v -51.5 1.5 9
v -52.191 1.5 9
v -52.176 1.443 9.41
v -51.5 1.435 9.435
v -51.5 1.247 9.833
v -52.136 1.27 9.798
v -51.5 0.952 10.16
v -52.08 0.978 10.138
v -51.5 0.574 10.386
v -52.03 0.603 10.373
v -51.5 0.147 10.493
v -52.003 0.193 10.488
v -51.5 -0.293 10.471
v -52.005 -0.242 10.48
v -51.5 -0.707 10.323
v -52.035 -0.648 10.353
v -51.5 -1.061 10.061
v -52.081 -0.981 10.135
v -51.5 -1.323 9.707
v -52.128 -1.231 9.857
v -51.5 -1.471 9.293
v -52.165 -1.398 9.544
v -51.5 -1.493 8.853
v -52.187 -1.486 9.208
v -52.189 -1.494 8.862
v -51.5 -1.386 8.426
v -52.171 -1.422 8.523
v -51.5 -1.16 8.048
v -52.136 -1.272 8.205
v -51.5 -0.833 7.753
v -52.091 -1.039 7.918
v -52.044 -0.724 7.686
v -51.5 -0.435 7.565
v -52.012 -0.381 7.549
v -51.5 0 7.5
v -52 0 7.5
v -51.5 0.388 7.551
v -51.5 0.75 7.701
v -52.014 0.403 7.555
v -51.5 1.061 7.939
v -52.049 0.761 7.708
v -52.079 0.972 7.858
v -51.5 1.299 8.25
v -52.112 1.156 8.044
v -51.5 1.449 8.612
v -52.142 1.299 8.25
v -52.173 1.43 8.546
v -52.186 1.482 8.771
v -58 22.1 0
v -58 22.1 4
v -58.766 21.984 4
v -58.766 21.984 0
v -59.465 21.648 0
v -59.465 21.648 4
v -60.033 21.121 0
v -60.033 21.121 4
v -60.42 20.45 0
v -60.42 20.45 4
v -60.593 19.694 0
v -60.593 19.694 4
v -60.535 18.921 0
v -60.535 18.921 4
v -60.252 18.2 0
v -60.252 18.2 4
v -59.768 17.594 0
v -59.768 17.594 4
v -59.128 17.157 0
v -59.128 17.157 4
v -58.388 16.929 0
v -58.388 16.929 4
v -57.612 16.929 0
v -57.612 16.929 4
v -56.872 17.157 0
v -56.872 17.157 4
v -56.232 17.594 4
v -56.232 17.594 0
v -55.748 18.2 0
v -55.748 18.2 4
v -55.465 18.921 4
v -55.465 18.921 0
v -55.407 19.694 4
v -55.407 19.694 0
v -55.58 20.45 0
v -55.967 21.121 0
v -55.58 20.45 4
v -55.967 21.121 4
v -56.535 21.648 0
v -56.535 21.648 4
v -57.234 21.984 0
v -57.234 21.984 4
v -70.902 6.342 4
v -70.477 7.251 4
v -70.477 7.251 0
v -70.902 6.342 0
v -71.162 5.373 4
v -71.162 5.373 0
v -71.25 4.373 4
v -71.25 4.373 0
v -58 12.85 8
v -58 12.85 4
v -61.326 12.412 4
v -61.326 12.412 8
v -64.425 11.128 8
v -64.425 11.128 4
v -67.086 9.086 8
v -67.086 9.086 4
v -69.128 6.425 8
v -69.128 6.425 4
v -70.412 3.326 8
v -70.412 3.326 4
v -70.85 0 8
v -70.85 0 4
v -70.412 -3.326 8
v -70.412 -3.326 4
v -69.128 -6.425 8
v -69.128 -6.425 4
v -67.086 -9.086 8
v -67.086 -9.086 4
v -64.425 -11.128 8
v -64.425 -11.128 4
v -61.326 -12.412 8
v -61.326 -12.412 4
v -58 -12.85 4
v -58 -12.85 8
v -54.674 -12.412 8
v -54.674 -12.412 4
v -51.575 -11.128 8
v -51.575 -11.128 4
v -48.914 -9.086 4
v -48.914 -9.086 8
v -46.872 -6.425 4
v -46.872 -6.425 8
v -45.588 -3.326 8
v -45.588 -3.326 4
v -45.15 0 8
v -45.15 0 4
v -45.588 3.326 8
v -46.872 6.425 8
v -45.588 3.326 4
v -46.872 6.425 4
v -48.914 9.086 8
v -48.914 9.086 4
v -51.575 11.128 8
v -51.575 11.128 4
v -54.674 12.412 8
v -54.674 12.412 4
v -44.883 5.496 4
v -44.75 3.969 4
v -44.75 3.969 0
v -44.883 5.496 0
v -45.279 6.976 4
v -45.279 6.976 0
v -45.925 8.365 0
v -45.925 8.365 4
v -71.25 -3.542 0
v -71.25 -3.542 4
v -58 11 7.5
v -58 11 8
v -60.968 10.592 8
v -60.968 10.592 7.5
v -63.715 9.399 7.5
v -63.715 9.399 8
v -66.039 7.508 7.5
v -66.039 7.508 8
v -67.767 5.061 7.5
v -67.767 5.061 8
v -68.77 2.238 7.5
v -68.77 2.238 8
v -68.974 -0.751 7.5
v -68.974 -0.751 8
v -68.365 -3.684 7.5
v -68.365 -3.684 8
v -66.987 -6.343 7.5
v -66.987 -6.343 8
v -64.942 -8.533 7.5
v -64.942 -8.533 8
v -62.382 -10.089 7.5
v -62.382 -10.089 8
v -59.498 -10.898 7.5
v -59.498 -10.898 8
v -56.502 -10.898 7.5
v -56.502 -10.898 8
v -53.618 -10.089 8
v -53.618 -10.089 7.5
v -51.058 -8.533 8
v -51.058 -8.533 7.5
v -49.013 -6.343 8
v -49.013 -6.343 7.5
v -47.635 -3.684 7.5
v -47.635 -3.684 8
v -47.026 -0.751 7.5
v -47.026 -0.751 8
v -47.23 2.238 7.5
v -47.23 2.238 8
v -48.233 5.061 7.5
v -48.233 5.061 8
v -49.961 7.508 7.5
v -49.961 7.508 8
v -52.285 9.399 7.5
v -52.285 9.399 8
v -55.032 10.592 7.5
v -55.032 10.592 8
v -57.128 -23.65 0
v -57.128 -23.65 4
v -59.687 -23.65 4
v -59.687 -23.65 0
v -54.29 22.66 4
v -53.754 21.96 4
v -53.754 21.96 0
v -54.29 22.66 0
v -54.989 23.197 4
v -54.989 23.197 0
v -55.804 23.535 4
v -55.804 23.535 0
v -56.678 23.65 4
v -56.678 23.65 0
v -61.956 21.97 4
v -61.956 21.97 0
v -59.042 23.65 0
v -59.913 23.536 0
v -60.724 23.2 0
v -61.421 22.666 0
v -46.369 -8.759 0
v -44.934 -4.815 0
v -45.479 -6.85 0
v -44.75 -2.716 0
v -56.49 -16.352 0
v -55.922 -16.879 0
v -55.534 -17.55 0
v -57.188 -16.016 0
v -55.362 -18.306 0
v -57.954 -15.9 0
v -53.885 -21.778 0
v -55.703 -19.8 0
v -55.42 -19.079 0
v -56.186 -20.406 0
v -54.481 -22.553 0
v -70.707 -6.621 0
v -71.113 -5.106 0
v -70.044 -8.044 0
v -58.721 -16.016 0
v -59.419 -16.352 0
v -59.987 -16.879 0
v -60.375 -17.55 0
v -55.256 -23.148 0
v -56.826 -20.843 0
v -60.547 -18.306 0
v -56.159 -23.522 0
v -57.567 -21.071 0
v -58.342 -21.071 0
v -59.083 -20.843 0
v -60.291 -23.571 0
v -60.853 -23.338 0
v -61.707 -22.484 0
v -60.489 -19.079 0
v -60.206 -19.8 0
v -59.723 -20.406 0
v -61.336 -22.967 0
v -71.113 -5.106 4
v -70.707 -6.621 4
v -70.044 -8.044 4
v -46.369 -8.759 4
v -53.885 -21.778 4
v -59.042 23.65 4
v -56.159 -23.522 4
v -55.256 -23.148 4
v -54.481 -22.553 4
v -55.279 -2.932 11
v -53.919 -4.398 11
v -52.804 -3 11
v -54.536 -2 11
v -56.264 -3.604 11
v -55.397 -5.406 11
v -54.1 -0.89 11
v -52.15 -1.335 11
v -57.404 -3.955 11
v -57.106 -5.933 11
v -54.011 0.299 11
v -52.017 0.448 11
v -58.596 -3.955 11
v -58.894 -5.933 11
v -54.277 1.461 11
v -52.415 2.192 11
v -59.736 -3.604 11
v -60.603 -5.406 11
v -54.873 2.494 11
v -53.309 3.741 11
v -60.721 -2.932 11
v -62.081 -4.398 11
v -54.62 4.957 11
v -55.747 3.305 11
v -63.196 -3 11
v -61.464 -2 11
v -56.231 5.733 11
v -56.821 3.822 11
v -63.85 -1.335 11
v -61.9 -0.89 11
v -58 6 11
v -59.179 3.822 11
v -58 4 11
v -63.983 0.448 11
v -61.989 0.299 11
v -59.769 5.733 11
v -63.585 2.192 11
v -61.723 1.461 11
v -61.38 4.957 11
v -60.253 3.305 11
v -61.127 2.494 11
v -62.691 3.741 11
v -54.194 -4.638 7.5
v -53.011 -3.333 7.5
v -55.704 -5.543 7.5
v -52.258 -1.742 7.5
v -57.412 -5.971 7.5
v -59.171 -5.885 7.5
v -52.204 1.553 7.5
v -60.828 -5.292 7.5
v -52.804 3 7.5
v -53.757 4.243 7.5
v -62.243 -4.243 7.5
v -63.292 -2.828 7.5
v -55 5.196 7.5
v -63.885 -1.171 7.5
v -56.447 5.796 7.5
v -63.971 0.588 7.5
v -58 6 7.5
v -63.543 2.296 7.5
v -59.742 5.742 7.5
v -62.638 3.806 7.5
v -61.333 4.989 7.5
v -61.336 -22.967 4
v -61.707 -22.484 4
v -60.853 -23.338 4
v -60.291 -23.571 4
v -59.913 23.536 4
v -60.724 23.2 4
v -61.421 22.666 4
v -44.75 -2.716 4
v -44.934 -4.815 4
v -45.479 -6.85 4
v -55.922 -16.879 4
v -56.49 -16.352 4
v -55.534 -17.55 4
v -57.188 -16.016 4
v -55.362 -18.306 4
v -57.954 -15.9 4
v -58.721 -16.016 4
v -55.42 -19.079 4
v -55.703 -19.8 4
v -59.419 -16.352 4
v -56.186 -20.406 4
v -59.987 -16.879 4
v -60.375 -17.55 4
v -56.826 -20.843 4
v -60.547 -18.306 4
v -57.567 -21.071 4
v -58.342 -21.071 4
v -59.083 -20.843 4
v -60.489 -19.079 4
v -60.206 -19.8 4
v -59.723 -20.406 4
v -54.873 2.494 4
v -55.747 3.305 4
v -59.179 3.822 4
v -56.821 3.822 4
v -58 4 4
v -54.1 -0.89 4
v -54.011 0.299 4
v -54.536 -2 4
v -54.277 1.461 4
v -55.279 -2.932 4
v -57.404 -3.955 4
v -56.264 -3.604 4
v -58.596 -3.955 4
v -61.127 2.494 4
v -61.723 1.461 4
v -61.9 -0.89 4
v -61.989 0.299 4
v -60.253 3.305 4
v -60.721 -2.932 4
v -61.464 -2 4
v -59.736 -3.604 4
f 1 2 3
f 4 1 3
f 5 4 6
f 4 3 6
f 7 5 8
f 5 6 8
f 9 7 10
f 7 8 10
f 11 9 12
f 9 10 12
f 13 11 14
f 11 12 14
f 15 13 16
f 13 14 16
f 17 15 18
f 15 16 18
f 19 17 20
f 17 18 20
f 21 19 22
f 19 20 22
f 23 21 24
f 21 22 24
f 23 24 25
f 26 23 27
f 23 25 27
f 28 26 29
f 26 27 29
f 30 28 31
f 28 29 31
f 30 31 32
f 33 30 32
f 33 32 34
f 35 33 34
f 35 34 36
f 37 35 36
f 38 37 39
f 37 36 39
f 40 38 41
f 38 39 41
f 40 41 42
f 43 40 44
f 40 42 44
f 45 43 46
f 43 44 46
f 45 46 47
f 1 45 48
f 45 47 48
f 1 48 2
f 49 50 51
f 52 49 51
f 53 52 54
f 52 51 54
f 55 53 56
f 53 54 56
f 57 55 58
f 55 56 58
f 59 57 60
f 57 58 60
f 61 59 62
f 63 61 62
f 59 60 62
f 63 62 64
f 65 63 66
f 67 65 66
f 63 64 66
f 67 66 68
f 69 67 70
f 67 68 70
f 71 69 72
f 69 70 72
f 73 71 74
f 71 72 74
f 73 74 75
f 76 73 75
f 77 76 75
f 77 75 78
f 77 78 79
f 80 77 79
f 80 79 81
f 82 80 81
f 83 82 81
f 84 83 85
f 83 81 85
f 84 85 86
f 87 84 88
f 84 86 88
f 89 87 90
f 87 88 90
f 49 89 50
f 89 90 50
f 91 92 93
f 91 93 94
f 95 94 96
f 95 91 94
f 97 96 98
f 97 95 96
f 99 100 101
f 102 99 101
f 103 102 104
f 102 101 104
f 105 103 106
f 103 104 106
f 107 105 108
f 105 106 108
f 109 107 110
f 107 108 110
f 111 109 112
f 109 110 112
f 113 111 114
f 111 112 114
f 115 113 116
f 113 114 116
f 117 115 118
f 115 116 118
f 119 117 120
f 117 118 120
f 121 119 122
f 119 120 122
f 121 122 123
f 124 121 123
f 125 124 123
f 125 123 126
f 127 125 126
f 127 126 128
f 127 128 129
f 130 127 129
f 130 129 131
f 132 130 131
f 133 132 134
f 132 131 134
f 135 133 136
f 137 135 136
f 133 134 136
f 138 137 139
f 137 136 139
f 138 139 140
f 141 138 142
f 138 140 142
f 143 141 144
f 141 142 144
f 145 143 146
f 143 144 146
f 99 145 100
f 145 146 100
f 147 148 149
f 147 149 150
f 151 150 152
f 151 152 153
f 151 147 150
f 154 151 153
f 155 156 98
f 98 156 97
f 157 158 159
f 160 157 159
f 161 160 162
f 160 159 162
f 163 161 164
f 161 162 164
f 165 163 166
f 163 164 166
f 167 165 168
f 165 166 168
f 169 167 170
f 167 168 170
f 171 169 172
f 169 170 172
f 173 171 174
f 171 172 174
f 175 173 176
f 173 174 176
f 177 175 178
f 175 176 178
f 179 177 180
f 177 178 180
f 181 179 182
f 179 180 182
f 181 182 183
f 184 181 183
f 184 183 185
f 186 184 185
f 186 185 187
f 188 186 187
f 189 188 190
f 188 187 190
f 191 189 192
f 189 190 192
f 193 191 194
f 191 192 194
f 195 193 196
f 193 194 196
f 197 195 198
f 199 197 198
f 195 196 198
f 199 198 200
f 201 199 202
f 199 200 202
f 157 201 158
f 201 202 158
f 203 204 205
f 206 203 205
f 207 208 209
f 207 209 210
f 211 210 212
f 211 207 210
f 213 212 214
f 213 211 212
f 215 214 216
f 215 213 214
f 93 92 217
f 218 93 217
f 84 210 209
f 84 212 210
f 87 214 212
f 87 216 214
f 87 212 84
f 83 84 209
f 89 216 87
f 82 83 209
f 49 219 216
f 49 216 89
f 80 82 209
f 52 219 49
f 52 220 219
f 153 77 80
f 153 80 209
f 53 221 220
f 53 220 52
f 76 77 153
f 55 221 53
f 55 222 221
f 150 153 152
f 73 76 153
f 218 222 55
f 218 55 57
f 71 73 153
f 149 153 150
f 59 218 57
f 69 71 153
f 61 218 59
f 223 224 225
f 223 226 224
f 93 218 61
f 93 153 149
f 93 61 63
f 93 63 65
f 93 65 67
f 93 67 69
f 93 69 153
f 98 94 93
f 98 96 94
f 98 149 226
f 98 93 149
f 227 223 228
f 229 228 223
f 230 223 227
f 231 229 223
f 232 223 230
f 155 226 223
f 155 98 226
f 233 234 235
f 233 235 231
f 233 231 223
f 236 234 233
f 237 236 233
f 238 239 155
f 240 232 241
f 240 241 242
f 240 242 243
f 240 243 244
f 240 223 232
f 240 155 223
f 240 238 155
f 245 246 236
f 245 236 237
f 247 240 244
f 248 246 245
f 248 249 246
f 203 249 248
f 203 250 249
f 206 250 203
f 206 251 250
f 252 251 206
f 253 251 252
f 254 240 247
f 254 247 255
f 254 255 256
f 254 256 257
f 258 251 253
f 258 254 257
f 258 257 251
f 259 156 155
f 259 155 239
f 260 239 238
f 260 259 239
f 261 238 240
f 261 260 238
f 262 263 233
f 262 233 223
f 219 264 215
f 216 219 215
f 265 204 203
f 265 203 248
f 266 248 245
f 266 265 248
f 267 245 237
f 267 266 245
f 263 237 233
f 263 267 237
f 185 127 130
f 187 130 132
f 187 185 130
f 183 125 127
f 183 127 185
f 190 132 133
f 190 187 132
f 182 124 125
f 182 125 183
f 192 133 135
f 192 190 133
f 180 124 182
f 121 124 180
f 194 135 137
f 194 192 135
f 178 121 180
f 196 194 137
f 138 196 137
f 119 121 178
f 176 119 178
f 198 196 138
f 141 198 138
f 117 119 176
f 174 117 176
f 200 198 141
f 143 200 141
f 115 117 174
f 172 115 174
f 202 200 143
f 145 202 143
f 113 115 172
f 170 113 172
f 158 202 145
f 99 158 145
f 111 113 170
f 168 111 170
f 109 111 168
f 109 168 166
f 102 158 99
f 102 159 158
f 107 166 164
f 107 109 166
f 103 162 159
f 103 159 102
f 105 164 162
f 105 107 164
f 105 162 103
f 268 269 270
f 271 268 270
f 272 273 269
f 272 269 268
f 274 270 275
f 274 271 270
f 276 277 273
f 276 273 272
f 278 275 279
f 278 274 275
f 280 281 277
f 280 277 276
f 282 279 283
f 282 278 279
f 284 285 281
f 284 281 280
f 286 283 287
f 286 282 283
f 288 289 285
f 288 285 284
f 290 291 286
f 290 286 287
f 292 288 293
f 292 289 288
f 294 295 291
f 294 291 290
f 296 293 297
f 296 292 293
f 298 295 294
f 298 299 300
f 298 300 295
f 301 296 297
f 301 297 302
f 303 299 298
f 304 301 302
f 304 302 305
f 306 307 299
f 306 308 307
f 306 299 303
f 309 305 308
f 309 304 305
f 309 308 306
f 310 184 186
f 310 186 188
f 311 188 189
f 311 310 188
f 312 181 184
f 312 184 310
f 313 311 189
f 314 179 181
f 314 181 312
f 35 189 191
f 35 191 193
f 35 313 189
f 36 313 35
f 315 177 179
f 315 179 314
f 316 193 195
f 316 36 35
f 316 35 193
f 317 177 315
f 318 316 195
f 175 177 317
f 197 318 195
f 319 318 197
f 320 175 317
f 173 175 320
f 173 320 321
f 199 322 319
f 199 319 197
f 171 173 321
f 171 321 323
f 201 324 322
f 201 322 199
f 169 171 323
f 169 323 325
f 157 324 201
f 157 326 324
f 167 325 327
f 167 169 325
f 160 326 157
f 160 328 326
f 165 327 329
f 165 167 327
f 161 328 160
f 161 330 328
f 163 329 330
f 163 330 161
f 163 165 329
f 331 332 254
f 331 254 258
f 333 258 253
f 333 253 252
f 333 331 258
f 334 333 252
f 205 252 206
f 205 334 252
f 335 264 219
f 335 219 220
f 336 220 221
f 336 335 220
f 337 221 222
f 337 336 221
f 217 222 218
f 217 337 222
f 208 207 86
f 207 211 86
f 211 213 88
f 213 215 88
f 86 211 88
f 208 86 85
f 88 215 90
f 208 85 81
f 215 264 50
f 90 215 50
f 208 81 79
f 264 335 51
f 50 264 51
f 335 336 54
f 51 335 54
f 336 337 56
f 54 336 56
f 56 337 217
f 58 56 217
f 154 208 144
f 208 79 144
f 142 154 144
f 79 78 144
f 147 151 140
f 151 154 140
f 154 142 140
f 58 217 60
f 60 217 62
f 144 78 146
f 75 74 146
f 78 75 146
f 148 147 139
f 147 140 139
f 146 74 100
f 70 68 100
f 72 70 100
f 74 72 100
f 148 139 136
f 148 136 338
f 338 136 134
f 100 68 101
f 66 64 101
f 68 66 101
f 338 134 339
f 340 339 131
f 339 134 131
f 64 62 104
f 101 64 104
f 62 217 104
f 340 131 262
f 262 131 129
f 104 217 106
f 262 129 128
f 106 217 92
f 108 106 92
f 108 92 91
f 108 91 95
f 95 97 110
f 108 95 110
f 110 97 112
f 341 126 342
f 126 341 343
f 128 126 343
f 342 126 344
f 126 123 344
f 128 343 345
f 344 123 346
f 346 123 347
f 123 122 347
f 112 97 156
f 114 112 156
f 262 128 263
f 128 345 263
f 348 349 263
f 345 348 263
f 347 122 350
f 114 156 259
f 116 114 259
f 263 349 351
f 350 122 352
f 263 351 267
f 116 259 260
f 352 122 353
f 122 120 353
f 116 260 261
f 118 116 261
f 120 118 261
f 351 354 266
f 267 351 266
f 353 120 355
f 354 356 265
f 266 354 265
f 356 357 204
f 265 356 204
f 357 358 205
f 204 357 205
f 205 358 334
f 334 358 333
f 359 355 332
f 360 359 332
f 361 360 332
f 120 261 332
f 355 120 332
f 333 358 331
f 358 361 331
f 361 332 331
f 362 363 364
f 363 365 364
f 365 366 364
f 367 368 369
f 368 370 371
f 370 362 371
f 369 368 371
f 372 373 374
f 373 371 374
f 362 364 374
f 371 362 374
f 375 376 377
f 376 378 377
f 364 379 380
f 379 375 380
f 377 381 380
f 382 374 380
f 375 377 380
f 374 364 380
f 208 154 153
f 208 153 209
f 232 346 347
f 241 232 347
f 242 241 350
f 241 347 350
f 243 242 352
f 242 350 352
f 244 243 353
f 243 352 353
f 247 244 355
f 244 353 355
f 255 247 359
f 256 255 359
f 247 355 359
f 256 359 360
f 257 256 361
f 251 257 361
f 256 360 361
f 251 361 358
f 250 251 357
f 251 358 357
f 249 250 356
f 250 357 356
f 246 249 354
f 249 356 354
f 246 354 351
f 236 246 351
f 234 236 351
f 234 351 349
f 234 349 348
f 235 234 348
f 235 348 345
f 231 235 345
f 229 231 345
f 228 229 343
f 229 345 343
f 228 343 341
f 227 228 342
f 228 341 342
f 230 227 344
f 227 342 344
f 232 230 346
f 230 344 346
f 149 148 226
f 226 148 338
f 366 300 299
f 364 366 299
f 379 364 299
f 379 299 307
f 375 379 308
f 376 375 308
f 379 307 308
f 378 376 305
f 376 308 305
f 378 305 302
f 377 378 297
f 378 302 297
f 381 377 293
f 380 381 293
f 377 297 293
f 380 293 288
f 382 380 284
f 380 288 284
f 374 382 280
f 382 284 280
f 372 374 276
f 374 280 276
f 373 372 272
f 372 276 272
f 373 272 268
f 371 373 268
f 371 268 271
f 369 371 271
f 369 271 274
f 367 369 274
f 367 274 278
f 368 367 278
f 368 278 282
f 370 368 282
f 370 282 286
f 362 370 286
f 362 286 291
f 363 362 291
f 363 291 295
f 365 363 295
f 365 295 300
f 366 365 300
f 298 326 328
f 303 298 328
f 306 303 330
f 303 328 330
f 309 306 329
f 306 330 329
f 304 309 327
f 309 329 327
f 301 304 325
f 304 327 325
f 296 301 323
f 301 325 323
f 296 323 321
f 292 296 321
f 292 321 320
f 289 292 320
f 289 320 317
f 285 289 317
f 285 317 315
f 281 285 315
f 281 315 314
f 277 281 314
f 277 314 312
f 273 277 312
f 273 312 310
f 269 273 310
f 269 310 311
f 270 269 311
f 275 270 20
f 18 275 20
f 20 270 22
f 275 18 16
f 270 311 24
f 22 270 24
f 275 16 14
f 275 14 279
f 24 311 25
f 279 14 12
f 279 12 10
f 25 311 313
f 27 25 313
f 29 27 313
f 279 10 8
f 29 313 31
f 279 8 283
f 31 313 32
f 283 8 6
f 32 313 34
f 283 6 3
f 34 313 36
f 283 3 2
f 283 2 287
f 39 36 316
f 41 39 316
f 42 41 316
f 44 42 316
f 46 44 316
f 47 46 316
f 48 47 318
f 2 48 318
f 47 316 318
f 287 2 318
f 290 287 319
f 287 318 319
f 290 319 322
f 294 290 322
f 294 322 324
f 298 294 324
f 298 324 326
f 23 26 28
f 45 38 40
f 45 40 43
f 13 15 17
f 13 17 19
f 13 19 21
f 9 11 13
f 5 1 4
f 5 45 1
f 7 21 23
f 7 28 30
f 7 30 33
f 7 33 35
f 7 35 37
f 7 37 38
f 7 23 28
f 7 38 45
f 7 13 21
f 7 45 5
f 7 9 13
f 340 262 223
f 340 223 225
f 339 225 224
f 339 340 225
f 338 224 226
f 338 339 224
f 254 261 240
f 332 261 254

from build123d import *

# Parameters (mm, degrees)
SKETCH012_R             = 12.85
PAD006_DEPTH            = 4
SKETCH013_R             = 11
POCKET004_DEPTH         = 0.5
SKETCH014_R             = 6
PAD007_DEPTH            = 3.5
SKETCH016_R             = 1.5
PAD008_DEPTH            = 6.5
SKETCH015_R             = 4
POCKET005_DEPTH         = 7.001
SKETCH017_R             = 2.6
PAD009_DEPTH            = 4
BODY002_PLACEMENT_ANGLE = 90


with BuildPart() as part:
    # Sketch012 → Pad006 (new body)
    with BuildSketch(Plane.XY):
        Circle(SKETCH012_R)
    extrude(amount=PAD006_DEPTH)

    # Sketch013 → Pocket004 (cut)
    with BuildSketch(Plane.XY.offset(4)):
        Circle(SKETCH013_R)
    extrude(amount=-POCKET004_DEPTH, mode=Mode.SUBTRACT)

    # Sketch014 (on Face5 of Pocket004) → Pad007 (join)
    with BuildSketch(Plane.XY.offset(3.5)):
        Circle(SKETCH014_R)
    extrude(amount=PAD007_DEPTH)

    # Sketch016 → Pad008 (join)
    with BuildSketch(Plane.XZ):
        with Locations((0, 5)):
            Circle(SKETCH016_R)
    extrude(amount=PAD008_DEPTH)

    # Sketch015 (on Face7 of Pad007) → Pocket005 (cut, through all)
    with BuildSketch(Plane.XY.offset(7)):
        Circle(SKETCH015_R)
    extrude(amount=-POCKET005_DEPTH, mode=Mode.SUBTRACT)

    # Sketch017 → Pad009 (join)
    with BuildSketch(Plane.XY):
        with BuildLine():
            Line((-3.542445, 13.25), (4.373404, 13.25))
            ThreePointArc((7.251161, 12.477086), (5.863276, 13.053407), (4.373404, 13.25))
            Line((7.251161, 12.477086), (21.969939, 3.956011))
            ThreePointArc((23.65, 1.04209), (23.1999, 2.72387), (21.969939, 3.956011))
            Line((23.65, 1.04209), (23.65, -1.322208))
            ThreePointArc((21.959502, -4.246432), (23.196964, -3.011059), (23.65, -1.322208))
            Line((8.3652, -12.074699), (21.959502, -4.246432))
            ThreePointArc((3.969015, -13.25), (6.244305, -12.951104), (8.3652, -12.074699))
            Line((3.969015, -13.25), (-2.715889, -13.25))
            ThreePointArc((-8.759411, -11.630643), (-5.844246, -12.838144), (-2.715889, -13.25))
            Line((-21.777636, -4.114568), (-8.759411, -11.630643))
            ThreePointArc((-23.65, -0.871538), (-23.148302, -2.743902), (-21.777636, -4.114568))
            Line((-23.65, -0.871538), (-23.65, 1.686966))
            ThreePointArc((-22.483817, 3.706854), (-23.337522, 2.853149), (-23.65, 1.686966))
            Line((-8.043592, 12.043921), (-22.483817, 3.706854))
            ThreePointArc((-3.542445, 13.25), (-5.87241, 12.943254), (-8.043592, 12.043921))
        make_face()
        with Locations((-18.5, -0.045589)):
            Circle(SKETCH017_R, mode=Mode.SUBTRACT)
        with Locations((19.5, 0)):
            Circle(SKETCH017_R, mode=Mode.SUBTRACT)
    extrude(amount=-PAD009_DEPTH)


with BuildPart() as part_1:
    # Body002 placement: moved
    add(part.part.moved(Location((-58, 0, 4))).rotate(Axis((-58, 0, 4), (0, 0, 1)), BODY002_PLACEMENT_ANGLE))


solid = part_1.part
